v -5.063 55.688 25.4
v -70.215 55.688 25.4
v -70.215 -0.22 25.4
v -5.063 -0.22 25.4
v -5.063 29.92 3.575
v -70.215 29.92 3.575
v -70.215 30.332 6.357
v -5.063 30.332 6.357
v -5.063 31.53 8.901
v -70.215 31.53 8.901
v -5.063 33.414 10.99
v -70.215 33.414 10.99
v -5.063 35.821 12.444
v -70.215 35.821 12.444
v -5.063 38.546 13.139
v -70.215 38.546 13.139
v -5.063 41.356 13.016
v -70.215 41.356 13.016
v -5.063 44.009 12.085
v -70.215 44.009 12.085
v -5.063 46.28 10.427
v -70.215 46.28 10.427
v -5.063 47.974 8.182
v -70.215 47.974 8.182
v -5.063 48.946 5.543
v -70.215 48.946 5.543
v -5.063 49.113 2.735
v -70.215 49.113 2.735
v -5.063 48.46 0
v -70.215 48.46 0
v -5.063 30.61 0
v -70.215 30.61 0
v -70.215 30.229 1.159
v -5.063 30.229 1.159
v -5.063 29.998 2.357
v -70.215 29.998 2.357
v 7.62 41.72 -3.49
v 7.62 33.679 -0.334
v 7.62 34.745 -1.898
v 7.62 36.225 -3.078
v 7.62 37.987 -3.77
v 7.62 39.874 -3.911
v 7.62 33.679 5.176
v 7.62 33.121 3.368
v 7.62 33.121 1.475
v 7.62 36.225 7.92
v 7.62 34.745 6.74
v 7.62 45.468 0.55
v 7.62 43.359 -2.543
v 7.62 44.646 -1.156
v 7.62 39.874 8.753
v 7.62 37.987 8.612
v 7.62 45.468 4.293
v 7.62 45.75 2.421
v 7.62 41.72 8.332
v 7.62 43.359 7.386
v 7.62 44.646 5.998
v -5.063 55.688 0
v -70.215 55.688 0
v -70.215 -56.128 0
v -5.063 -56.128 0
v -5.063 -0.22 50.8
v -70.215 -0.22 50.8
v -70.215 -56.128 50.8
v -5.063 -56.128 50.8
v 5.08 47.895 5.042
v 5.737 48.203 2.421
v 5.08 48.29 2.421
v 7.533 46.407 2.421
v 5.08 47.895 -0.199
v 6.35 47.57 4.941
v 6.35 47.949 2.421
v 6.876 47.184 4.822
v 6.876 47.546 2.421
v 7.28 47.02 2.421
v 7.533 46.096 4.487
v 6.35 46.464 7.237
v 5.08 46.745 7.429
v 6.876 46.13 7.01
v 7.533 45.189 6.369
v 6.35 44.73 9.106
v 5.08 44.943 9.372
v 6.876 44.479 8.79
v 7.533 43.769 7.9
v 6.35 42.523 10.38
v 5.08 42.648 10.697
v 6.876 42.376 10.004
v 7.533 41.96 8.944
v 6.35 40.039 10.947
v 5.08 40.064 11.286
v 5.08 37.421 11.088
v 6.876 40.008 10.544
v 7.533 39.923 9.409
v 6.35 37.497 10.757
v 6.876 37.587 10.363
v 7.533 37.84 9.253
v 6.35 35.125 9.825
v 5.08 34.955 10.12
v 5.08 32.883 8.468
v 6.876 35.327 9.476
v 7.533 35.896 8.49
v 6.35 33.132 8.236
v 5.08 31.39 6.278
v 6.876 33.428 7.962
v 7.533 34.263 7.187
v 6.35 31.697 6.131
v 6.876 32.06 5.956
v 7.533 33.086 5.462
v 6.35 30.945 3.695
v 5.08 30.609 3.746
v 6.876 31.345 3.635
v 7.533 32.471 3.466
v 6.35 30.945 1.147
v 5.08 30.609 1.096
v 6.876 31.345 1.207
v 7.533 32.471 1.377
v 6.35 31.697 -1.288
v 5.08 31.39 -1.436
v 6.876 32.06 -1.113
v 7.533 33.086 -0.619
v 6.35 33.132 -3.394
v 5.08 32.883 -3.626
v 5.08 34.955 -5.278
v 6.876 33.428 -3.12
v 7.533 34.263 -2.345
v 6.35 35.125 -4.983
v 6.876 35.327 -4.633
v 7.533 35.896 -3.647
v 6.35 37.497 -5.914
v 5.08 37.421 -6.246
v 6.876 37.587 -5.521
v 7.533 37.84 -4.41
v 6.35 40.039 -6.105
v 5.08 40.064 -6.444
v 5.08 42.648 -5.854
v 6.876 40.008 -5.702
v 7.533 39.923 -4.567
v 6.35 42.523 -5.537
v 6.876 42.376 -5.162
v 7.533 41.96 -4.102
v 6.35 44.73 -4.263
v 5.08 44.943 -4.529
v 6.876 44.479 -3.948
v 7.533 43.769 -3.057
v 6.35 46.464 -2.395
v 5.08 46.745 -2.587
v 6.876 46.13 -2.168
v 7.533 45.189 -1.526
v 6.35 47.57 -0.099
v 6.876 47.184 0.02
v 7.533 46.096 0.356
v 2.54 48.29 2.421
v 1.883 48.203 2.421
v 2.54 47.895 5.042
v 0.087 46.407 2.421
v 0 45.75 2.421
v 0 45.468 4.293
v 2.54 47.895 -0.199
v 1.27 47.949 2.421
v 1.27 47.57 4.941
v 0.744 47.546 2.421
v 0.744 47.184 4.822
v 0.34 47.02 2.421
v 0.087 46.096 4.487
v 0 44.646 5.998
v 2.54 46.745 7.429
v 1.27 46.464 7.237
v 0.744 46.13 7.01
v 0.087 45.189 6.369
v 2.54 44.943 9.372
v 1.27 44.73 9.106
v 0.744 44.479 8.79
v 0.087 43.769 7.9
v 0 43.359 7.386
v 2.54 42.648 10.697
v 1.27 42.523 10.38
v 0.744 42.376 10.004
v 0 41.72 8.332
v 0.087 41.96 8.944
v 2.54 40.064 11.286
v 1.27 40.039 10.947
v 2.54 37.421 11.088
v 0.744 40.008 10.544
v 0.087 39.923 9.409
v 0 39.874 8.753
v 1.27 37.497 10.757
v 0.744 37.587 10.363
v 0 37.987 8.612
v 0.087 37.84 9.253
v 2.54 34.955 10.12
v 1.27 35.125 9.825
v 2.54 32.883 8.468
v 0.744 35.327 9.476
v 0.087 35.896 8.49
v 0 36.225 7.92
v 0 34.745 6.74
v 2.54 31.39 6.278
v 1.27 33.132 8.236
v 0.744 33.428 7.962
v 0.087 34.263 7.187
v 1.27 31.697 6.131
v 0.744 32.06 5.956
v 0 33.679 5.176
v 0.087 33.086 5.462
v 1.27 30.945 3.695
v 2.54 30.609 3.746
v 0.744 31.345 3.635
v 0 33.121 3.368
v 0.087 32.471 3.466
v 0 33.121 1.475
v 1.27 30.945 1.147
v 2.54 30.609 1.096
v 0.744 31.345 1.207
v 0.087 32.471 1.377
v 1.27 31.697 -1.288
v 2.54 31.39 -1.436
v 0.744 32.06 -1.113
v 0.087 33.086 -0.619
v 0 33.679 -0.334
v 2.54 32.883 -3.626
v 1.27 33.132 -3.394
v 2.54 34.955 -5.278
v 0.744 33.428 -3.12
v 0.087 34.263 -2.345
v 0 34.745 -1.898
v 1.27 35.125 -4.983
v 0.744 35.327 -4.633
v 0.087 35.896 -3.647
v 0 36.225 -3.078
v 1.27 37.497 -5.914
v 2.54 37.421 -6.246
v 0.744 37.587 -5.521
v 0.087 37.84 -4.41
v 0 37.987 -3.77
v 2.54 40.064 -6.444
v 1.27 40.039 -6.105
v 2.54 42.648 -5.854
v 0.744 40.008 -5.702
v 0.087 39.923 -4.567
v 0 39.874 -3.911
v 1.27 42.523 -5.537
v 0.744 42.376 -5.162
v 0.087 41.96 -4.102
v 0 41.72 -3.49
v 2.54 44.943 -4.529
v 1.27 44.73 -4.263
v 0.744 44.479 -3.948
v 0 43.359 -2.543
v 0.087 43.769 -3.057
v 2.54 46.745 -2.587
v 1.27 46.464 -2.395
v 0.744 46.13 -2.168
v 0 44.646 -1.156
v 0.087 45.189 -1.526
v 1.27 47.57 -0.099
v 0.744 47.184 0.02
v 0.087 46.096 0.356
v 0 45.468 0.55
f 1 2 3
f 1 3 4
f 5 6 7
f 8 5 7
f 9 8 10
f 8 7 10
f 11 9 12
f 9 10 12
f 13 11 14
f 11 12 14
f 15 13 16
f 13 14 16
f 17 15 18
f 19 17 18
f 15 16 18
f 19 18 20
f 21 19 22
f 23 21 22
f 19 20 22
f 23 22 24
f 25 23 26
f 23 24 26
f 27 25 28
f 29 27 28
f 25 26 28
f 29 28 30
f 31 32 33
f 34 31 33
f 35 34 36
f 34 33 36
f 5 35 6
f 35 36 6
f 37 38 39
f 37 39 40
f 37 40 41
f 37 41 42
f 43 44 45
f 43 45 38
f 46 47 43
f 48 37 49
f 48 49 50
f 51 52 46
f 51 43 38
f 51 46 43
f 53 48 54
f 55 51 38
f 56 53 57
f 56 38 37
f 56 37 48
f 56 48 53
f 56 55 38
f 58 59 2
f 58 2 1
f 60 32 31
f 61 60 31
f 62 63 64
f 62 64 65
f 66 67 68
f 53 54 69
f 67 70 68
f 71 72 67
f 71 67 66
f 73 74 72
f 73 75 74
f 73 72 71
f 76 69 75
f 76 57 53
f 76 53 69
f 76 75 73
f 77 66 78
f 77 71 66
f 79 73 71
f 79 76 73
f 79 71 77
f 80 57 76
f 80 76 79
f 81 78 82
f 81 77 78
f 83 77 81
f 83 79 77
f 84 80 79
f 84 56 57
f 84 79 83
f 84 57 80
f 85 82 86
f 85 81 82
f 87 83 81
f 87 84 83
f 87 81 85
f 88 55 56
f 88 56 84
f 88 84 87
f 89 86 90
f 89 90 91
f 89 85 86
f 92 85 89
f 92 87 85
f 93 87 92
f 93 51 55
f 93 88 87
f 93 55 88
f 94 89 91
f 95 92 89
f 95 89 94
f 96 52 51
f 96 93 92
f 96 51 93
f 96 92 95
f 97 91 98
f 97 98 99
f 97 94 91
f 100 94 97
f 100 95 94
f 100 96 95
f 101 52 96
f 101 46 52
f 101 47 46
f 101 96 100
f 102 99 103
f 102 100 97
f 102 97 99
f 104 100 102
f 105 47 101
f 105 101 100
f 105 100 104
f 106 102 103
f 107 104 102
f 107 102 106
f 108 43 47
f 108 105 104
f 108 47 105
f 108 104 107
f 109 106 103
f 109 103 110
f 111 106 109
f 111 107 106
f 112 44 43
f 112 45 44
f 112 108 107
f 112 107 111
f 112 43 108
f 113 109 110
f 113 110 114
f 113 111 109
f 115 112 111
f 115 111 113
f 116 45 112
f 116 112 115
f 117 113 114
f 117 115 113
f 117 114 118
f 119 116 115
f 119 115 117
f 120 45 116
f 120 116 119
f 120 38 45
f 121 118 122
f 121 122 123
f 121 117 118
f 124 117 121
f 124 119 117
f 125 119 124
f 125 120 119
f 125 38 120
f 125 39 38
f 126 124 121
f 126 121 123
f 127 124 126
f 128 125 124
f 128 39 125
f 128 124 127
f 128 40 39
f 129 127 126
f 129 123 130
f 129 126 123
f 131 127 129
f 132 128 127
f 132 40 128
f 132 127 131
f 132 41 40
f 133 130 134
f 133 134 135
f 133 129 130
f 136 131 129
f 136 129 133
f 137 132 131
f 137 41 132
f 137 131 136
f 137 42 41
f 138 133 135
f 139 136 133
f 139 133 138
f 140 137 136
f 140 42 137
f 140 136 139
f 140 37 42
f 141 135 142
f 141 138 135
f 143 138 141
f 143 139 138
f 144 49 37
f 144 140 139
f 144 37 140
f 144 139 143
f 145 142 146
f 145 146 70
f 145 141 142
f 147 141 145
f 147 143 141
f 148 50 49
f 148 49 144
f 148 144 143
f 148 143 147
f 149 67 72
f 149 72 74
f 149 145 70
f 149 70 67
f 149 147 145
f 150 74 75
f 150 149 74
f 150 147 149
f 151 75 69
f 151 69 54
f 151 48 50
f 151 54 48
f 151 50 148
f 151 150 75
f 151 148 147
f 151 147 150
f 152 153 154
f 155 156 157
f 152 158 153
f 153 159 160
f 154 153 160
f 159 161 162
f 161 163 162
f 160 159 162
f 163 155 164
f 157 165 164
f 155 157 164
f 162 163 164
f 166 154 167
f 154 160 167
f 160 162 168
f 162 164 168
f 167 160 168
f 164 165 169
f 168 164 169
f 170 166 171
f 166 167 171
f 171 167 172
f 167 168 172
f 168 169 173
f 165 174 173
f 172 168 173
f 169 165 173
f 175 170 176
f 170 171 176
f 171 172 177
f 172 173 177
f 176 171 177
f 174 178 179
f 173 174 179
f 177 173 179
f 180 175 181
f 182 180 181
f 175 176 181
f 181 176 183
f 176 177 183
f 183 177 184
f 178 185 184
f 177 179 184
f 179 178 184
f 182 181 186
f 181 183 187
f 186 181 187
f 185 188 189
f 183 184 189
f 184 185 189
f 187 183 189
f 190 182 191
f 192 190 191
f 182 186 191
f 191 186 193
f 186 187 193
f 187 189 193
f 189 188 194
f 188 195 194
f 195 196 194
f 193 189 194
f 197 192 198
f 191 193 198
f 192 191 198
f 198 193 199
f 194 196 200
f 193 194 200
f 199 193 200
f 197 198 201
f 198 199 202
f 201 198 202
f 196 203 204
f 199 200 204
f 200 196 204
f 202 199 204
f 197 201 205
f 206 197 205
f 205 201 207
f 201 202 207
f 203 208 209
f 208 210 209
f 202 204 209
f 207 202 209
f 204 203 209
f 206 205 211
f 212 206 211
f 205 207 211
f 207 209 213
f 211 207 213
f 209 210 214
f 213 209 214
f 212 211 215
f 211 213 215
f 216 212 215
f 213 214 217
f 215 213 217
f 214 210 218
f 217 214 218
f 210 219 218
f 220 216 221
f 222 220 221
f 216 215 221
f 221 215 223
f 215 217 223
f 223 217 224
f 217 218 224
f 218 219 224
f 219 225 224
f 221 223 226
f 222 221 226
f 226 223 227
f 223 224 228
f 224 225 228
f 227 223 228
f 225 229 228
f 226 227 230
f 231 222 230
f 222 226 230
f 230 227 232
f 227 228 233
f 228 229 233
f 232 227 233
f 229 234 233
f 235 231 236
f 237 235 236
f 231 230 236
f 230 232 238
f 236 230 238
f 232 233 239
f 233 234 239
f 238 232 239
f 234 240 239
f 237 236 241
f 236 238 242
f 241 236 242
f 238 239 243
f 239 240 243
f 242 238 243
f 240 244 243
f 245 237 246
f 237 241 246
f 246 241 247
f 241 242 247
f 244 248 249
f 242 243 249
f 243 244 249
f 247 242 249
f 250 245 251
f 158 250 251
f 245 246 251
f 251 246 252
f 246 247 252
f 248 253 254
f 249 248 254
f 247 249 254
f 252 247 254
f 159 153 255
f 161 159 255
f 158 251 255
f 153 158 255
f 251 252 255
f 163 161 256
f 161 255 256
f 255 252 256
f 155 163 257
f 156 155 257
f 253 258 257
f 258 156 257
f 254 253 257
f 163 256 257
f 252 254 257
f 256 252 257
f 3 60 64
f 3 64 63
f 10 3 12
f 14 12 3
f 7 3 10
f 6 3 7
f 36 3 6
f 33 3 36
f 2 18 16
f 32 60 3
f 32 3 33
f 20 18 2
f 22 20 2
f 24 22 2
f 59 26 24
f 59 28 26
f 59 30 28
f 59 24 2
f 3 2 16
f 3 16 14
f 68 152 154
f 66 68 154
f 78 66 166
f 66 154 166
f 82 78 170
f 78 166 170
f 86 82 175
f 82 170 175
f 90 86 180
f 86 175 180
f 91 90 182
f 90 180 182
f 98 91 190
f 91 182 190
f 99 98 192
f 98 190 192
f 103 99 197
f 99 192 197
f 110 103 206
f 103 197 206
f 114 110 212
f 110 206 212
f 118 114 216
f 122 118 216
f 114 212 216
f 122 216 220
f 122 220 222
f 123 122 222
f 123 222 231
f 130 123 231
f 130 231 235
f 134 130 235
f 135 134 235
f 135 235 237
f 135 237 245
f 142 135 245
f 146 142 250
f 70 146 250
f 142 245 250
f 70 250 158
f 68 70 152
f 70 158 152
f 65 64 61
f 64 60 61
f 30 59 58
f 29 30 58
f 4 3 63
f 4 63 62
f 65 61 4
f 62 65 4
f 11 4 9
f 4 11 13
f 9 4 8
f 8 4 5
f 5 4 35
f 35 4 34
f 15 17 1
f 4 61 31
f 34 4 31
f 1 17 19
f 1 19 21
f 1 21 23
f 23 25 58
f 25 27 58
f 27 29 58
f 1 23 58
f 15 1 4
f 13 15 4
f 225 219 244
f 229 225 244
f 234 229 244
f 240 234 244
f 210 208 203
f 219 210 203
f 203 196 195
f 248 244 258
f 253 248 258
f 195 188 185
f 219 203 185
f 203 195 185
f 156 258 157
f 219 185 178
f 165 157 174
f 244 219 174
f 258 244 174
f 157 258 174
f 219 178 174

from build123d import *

# Parameters (mm, degrees)
F0_W     = 65.152568
F0_H     = 111.8159
F1_DEPTH = 25.4
F2_W     = 65.152568
F2_H     = 55.90795
F3_DEPTH = 25.4
F5_DEPTH = 76.2
F6_R     = 8.89
F7_DEPTH = 7.62
F8_R     = 2.54


with BuildPart() as f1:
    # F0 (on Top) → F1 (new body)
    with BuildSketch(Plane.XY):
        with Locations((-37.638815, -0.220109)):
            Rectangle(F0_W, F0_H)
    extrude(amount=F1_DEPTH)

    # F2 (on face) → F3 (join)
    with BuildSketch(Plane.XY.offset(25.4)):
        with Locations((-37.638815, -28.174084)):
            Rectangle(F2_W, F2_H)
    extrude(amount=F3_DEPTH)

    # F4 (on face) → F5 (cut)
    with BuildSketch(Plane(origin=(-70.215099, 0, 0), x_dir=(0, -1, 0), z_dir=(-1, 0, 0))):
        with BuildLine():
            ThreePointArc((-30.609912, 0), (-30.094369, 1.754719), (-29.920423, 3.575314))
            ThreePointArc((-29.920423, 3.575314), (-41.355577, 13.015928), (-48.460053, 0))
            Line((-48.460053, 0), (-30.609912, 0))
        make_face()
        with BuildLine():
            Line((-30.609912, 0), (-48.460053, 0))
            ThreePointArc((-48.460053, 0), (-39.534982, -6.039246), (-30.609912, 0))
        make_face()
    extrude(amount=-F5_DEPTH, mode=Mode.SUBTRACT)


with BuildPart() as f7:
    # F6 (on Right) → F7 (new body)
    with BuildSketch(Plane.YZ):
        with Locations((39.399695, 2.421211)):
            Circle(F6_R)
    extrude(amount=F7_DEPTH)

    # F8
    f8_edges = [f7.edges().sort_by_distance(p)[0] for p in [
        (7.62, 30.509695, 2.421211),
        (0, 30.509695, 2.421211),
    ]]
    fillet(f8_edges, radius=F8_R)


solid = Compound([f1.part, f7.part])
